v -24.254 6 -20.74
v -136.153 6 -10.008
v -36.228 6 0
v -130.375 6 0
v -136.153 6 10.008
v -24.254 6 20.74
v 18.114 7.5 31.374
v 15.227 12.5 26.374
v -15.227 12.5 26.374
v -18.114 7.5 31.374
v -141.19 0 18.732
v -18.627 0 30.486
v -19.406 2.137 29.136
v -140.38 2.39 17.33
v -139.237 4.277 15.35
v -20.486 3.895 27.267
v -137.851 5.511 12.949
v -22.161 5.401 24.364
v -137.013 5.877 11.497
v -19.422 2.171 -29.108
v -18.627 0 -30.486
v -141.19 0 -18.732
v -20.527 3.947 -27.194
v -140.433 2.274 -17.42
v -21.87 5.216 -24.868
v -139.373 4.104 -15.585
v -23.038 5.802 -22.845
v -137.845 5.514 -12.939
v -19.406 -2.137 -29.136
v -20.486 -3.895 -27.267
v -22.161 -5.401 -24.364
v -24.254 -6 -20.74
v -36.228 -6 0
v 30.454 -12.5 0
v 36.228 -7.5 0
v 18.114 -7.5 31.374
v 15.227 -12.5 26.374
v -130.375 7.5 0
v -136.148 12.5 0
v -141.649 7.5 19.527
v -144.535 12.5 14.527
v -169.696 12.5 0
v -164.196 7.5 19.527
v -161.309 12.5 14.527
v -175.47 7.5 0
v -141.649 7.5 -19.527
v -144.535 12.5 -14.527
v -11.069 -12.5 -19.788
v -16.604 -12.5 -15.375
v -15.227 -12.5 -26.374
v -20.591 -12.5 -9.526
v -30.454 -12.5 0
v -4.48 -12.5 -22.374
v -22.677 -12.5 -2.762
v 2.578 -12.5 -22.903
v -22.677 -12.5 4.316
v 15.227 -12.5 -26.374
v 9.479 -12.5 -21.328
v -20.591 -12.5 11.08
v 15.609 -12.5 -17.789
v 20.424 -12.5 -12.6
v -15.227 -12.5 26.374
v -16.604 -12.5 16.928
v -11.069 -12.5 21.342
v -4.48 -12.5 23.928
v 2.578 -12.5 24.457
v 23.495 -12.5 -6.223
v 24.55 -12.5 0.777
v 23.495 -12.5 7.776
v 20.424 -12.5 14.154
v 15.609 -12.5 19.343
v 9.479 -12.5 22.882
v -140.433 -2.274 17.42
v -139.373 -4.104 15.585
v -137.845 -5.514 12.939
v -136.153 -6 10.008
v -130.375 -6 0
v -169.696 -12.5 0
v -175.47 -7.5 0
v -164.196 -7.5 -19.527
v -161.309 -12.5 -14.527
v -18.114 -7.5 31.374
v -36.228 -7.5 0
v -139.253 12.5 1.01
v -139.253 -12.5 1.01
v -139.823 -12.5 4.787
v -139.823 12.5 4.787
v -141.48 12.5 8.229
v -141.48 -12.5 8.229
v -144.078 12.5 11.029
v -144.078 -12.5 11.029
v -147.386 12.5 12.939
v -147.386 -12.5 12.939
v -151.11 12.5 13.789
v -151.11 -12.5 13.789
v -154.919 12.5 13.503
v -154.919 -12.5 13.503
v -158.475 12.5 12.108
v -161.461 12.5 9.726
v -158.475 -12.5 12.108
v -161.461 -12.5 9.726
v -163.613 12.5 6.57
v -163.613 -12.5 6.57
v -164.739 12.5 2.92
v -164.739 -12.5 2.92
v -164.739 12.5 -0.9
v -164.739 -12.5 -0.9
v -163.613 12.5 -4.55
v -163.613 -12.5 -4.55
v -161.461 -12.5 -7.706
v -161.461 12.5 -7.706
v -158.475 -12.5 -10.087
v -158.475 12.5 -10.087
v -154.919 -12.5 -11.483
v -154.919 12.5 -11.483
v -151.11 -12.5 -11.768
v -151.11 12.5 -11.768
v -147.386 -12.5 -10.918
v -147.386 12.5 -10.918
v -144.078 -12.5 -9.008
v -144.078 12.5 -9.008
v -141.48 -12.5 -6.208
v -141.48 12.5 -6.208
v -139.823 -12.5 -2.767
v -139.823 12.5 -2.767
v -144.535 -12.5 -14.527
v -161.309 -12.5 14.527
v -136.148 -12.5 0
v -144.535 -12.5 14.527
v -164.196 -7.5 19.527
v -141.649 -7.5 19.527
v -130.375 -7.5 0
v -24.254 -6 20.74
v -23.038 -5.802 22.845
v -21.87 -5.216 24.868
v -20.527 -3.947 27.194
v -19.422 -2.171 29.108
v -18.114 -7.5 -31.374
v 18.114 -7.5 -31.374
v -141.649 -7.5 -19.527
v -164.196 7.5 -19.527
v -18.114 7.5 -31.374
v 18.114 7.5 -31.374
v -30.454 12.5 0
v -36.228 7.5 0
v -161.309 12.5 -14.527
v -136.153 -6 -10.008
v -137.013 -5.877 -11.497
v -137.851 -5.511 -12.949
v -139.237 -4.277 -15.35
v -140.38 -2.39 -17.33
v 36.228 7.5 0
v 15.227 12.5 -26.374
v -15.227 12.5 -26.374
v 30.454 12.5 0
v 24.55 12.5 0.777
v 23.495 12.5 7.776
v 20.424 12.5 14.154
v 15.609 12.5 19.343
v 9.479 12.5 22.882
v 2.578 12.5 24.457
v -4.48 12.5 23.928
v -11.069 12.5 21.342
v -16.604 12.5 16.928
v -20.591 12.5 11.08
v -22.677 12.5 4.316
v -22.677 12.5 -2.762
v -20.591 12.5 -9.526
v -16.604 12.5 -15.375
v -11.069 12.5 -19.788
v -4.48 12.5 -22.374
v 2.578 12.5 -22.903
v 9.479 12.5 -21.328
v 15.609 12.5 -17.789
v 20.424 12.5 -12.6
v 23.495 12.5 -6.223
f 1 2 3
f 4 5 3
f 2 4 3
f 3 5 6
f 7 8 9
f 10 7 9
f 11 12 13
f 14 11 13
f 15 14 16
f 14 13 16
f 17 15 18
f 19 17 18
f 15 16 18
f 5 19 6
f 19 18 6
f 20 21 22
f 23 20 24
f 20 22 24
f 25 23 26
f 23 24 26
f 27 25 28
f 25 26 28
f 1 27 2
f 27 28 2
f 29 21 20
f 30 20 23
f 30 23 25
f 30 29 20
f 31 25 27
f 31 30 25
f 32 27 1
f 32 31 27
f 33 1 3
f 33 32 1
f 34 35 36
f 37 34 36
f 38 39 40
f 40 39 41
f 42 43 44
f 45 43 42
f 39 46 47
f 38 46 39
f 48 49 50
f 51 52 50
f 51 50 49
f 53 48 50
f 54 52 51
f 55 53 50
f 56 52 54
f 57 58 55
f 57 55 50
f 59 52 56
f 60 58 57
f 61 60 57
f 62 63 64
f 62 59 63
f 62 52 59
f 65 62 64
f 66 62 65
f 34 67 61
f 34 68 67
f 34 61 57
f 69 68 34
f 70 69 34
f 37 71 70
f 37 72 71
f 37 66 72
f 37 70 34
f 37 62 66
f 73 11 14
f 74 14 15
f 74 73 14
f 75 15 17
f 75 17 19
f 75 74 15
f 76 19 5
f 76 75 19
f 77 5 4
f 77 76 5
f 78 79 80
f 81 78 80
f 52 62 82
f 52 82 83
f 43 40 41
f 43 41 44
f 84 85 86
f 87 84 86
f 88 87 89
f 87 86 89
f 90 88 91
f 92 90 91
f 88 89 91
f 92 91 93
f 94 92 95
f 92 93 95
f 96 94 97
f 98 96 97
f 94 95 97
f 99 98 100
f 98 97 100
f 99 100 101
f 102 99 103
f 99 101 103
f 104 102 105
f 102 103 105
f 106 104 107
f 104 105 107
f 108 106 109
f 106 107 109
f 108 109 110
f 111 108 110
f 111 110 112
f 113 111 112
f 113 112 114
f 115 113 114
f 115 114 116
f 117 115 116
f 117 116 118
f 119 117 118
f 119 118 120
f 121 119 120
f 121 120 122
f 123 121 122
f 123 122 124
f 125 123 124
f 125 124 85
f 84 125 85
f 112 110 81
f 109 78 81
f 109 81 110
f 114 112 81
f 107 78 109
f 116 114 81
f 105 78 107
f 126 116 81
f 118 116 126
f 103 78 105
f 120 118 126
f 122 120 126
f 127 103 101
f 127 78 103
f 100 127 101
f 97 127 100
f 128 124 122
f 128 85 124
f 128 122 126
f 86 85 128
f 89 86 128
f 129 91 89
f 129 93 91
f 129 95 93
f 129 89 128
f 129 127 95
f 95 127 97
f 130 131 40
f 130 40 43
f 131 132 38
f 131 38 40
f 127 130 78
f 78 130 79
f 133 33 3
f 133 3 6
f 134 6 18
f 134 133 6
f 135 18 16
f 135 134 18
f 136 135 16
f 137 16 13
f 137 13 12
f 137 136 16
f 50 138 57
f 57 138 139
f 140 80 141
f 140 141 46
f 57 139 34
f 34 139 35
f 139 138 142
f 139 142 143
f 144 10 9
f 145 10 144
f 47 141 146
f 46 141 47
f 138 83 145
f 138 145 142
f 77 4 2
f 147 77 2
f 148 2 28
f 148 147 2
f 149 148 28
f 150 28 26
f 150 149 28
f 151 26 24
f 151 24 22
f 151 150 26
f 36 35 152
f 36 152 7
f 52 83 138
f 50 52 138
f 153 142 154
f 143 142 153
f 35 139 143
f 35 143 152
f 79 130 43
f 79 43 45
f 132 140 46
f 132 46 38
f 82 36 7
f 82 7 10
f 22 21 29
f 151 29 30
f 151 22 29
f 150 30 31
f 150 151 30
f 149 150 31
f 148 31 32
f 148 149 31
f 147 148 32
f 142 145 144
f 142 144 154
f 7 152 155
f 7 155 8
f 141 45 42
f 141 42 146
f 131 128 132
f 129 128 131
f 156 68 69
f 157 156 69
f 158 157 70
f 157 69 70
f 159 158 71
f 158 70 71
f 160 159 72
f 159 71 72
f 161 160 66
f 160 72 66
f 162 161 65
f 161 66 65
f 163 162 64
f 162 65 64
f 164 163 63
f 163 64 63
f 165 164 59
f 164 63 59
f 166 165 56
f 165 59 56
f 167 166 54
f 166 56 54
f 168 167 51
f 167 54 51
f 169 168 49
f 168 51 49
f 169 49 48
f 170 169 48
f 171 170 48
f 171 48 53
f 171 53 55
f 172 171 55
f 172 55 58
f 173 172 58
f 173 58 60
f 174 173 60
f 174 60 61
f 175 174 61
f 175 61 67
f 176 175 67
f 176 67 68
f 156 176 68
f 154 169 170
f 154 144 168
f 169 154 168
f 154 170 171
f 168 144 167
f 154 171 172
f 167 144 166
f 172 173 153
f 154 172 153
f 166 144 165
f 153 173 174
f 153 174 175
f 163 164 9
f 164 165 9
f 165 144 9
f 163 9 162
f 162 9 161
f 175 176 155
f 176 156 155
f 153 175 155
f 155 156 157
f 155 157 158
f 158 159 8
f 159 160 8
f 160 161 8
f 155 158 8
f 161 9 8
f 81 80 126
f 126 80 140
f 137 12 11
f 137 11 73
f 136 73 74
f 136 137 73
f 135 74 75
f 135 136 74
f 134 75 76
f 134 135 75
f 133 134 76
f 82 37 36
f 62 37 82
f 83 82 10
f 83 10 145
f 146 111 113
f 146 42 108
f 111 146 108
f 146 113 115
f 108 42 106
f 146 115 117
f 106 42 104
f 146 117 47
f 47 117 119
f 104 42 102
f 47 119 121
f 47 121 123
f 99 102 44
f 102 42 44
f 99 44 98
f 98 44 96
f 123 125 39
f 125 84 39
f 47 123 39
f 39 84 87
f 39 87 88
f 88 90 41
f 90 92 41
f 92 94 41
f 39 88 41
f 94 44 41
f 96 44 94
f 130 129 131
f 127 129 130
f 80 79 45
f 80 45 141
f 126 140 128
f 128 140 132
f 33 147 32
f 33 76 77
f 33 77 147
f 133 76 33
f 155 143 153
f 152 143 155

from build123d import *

# Parameters (mm, degrees)
F1_DEPTH    = 12.5
F2_DEPTH    = 12.5
F3_DEPTH    = 6
F5_R        = 12.8142300387
F4_R        = 23.7463809622
F8_T1_DEPTH = 174.1013942082
F8_T3_DEPTH = 174.1013942082
F9_SIZE     = 5
F9_2_SIZE   = 5


# Not quite as in the source:
# - a fillet or chamfer that OpenCascade refuses, or shapes differently, is made with other operations: its cross-section is extruded or revolved along the edge and cut away or added


with BuildPart() as f1:
    # F0 (on Front) → F1 (new body, symmetric)
    with BuildSketch(Plane.XZ):
        Polygon((18.1139551152, 31.3742905855), (-18.1139551152, 31.3742905855), (-36.2279102304, 0), (-18.1139551152, -31.3742905855), (18.1139551152, -31.3742905855), (36.2279102304, 0), align=None)
    extrude(amount=F1_DEPTH, both=True)

    # F7: sweep along a path in F7_path
    with BuildLine(Plane(origin=(18.1139551152, 12.5, -31.3742905855), x_dir=(0, 1, 0), z_dir=(0, 0, 1))) as f7_path:
        Line((0, 0), (-25, 0))
    # F4 (on face) → F7 (sweep, cut)
    with BuildSketch(Plane.XZ.offset(12.5)):
        with Locations((0.8038282976, 0.7768512587)):
            Circle(F4_R)
    sweep(path=f7_path.line, mode=Mode.SUBTRACT)

    # F9#2
    f9_2_edges = [f1.edges().sort_by_distance(p)[0] for p in [
        (27.170933, -12.5, -15.687145),
        (0, -12.5, -31.374291),
        (-27.170933, -12.5, -15.687145),
        (-27.170933, -12.5, 15.687145),
        (0, -12.5, 31.374291),
        (27.170933, -12.5, 15.687145),
        (27.170933, 12.5, 15.687145),
        (27.170933, 12.5, -15.687145),
        (0, 12.5, 31.374291),
        (-27.170933, 12.5, 15.687145),
        (-27.170933, 12.5, -15.687145),
        (0, 12.5, -31.374291),
    ]]
    chamfer(f9_2_edges, length=F9_2_SIZE)


with BuildPart() as f2:
    # F0 (on Front) → F2 (new body, symmetric)
    with BuildSketch(Plane.XZ):
        Polygon((-130.3748040067, 0), (-141.6485234433, 19.5266548544), (-164.1959623164, 19.5266548544), (-175.469681753, 0), (-164.1959623164, -19.5266548544), (-141.6485234433, -19.5266548544), align=None)
    extrude(amount=F2_DEPTH, both=True)

    # F6: sweep along a path in F6_path
    with BuildLine(Plane(origin=(-164.1959623164, 12.5, 19.5266548544), x_dir=(0, 1, 0), z_dir=(0, 0, 1))) as f6_path:
        Line((0, 0), (-25, 0))
    # F5 (on face) → F6 (sweep, cut)
    with BuildSketch(Plane.XZ.offset(12.5)):
        with Locations((-152.0675271749, 1.010288368)):
            Circle(F5_R)
    sweep(path=f6_path.line, mode=Mode.SUBTRACT)

    # F9
    f9_edges = [f2.edges().sort_by_distance(p)[0] for p in [
        (-152.922243, -12.5, -19.526655),
        (-169.832822, -12.5, -9.763327),
        (-169.832822, -12.5, 9.763327),
        (-152.922243, -12.5, 19.526655),
        (-136.011664, -12.5, -9.763327),
        (-136.011664, -12.5, 9.763327),
        (-152.922243, 12.5, -19.526655),
        (-169.832822, 12.5, -9.763327),
        (-169.832822, 12.5, 9.763327),
        (-152.922243, 12.5, 19.526655),
        (-136.011664, 12.5, 9.763327),
        (-136.011664, 12.5, -9.763327),
    ]]
    chamfer(f9_edges, length=F9_SIZE)


with BuildPart() as f3:
    # F0 (on Front) → F3 (new body, symmetric)
    with BuildSketch(Plane.XZ):
        Polygon((-36.2279102304, 0), (-18.1139551152, 31.3742905855), (-141.6485234433, 19.5266548544), (-130.3748040067, 0), (-141.6485234433, -19.5266548544), (-18.1139551152, -31.3742905855), align=None)
    extrude(amount=F3_DEPTH, both=True)

    # F8: fillet of radius 10 on 4 edges, made by hand

    # F8_s2 → F8_t1 (cut)
    with BuildSketch(Plane(origin=(-163.3877054019, 0, 15.669767926), x_dir=(0, 1, 0), z_dir=(0.9954325583, 0, -0.0954673862))):
        with BuildLine():
            ThreePointArc((-4, -32.960282292), (3.0710678119, -30.0313501039), (6, -22.960282292))
            Line((6, -22.960282292), (6, -32.960282292))
            Line((6, -32.960282292), (-4, -32.960282292))
        make_face()
        with BuildLine():
            ThreePointArc((4, -32.960282292), (-3.0710678119, -30.0313501039), (-6, -22.960282292))
            Line((-6, -22.960282292), (-6, -32.960282292))
            Line((-6, -32.960282292), (4, -32.960282292))
        make_face()
    extrude(amount=F8_T1_DEPTH, mode=Mode.SUBTRACT)

    # F8_s4 → F8_t3 (cut)
    with BuildSketch(Plane(origin=(9.9184908423, 0, 0.951237116), x_dir=(0, 1, 0), z_dir=(-0.9954325583, 0, -0.0954673862))):
        with BuildLine():
            ThreePointArc((4, -32.960282292), (-3.0710678119, -30.0313501039), (-6, -22.960282292))
            Line((-6, -22.960282292), (-6, -32.960282292))
            Line((-6, -32.960282292), (4, -32.960282292))
        make_face()
        with BuildLine():
            ThreePointArc((-4, -32.960282292), (3.0710678119, -30.0313501039), (6, -22.960282292))
            Line((6, -22.960282292), (6, -32.960282292))
            Line((6, -32.960282292), (-4, -32.960282292))
        make_face()
    extrude(amount=F8_T3_DEPTH, mode=Mode.SUBTRACT)


solid = Compound([f1.part, f2.part, f3.part])
